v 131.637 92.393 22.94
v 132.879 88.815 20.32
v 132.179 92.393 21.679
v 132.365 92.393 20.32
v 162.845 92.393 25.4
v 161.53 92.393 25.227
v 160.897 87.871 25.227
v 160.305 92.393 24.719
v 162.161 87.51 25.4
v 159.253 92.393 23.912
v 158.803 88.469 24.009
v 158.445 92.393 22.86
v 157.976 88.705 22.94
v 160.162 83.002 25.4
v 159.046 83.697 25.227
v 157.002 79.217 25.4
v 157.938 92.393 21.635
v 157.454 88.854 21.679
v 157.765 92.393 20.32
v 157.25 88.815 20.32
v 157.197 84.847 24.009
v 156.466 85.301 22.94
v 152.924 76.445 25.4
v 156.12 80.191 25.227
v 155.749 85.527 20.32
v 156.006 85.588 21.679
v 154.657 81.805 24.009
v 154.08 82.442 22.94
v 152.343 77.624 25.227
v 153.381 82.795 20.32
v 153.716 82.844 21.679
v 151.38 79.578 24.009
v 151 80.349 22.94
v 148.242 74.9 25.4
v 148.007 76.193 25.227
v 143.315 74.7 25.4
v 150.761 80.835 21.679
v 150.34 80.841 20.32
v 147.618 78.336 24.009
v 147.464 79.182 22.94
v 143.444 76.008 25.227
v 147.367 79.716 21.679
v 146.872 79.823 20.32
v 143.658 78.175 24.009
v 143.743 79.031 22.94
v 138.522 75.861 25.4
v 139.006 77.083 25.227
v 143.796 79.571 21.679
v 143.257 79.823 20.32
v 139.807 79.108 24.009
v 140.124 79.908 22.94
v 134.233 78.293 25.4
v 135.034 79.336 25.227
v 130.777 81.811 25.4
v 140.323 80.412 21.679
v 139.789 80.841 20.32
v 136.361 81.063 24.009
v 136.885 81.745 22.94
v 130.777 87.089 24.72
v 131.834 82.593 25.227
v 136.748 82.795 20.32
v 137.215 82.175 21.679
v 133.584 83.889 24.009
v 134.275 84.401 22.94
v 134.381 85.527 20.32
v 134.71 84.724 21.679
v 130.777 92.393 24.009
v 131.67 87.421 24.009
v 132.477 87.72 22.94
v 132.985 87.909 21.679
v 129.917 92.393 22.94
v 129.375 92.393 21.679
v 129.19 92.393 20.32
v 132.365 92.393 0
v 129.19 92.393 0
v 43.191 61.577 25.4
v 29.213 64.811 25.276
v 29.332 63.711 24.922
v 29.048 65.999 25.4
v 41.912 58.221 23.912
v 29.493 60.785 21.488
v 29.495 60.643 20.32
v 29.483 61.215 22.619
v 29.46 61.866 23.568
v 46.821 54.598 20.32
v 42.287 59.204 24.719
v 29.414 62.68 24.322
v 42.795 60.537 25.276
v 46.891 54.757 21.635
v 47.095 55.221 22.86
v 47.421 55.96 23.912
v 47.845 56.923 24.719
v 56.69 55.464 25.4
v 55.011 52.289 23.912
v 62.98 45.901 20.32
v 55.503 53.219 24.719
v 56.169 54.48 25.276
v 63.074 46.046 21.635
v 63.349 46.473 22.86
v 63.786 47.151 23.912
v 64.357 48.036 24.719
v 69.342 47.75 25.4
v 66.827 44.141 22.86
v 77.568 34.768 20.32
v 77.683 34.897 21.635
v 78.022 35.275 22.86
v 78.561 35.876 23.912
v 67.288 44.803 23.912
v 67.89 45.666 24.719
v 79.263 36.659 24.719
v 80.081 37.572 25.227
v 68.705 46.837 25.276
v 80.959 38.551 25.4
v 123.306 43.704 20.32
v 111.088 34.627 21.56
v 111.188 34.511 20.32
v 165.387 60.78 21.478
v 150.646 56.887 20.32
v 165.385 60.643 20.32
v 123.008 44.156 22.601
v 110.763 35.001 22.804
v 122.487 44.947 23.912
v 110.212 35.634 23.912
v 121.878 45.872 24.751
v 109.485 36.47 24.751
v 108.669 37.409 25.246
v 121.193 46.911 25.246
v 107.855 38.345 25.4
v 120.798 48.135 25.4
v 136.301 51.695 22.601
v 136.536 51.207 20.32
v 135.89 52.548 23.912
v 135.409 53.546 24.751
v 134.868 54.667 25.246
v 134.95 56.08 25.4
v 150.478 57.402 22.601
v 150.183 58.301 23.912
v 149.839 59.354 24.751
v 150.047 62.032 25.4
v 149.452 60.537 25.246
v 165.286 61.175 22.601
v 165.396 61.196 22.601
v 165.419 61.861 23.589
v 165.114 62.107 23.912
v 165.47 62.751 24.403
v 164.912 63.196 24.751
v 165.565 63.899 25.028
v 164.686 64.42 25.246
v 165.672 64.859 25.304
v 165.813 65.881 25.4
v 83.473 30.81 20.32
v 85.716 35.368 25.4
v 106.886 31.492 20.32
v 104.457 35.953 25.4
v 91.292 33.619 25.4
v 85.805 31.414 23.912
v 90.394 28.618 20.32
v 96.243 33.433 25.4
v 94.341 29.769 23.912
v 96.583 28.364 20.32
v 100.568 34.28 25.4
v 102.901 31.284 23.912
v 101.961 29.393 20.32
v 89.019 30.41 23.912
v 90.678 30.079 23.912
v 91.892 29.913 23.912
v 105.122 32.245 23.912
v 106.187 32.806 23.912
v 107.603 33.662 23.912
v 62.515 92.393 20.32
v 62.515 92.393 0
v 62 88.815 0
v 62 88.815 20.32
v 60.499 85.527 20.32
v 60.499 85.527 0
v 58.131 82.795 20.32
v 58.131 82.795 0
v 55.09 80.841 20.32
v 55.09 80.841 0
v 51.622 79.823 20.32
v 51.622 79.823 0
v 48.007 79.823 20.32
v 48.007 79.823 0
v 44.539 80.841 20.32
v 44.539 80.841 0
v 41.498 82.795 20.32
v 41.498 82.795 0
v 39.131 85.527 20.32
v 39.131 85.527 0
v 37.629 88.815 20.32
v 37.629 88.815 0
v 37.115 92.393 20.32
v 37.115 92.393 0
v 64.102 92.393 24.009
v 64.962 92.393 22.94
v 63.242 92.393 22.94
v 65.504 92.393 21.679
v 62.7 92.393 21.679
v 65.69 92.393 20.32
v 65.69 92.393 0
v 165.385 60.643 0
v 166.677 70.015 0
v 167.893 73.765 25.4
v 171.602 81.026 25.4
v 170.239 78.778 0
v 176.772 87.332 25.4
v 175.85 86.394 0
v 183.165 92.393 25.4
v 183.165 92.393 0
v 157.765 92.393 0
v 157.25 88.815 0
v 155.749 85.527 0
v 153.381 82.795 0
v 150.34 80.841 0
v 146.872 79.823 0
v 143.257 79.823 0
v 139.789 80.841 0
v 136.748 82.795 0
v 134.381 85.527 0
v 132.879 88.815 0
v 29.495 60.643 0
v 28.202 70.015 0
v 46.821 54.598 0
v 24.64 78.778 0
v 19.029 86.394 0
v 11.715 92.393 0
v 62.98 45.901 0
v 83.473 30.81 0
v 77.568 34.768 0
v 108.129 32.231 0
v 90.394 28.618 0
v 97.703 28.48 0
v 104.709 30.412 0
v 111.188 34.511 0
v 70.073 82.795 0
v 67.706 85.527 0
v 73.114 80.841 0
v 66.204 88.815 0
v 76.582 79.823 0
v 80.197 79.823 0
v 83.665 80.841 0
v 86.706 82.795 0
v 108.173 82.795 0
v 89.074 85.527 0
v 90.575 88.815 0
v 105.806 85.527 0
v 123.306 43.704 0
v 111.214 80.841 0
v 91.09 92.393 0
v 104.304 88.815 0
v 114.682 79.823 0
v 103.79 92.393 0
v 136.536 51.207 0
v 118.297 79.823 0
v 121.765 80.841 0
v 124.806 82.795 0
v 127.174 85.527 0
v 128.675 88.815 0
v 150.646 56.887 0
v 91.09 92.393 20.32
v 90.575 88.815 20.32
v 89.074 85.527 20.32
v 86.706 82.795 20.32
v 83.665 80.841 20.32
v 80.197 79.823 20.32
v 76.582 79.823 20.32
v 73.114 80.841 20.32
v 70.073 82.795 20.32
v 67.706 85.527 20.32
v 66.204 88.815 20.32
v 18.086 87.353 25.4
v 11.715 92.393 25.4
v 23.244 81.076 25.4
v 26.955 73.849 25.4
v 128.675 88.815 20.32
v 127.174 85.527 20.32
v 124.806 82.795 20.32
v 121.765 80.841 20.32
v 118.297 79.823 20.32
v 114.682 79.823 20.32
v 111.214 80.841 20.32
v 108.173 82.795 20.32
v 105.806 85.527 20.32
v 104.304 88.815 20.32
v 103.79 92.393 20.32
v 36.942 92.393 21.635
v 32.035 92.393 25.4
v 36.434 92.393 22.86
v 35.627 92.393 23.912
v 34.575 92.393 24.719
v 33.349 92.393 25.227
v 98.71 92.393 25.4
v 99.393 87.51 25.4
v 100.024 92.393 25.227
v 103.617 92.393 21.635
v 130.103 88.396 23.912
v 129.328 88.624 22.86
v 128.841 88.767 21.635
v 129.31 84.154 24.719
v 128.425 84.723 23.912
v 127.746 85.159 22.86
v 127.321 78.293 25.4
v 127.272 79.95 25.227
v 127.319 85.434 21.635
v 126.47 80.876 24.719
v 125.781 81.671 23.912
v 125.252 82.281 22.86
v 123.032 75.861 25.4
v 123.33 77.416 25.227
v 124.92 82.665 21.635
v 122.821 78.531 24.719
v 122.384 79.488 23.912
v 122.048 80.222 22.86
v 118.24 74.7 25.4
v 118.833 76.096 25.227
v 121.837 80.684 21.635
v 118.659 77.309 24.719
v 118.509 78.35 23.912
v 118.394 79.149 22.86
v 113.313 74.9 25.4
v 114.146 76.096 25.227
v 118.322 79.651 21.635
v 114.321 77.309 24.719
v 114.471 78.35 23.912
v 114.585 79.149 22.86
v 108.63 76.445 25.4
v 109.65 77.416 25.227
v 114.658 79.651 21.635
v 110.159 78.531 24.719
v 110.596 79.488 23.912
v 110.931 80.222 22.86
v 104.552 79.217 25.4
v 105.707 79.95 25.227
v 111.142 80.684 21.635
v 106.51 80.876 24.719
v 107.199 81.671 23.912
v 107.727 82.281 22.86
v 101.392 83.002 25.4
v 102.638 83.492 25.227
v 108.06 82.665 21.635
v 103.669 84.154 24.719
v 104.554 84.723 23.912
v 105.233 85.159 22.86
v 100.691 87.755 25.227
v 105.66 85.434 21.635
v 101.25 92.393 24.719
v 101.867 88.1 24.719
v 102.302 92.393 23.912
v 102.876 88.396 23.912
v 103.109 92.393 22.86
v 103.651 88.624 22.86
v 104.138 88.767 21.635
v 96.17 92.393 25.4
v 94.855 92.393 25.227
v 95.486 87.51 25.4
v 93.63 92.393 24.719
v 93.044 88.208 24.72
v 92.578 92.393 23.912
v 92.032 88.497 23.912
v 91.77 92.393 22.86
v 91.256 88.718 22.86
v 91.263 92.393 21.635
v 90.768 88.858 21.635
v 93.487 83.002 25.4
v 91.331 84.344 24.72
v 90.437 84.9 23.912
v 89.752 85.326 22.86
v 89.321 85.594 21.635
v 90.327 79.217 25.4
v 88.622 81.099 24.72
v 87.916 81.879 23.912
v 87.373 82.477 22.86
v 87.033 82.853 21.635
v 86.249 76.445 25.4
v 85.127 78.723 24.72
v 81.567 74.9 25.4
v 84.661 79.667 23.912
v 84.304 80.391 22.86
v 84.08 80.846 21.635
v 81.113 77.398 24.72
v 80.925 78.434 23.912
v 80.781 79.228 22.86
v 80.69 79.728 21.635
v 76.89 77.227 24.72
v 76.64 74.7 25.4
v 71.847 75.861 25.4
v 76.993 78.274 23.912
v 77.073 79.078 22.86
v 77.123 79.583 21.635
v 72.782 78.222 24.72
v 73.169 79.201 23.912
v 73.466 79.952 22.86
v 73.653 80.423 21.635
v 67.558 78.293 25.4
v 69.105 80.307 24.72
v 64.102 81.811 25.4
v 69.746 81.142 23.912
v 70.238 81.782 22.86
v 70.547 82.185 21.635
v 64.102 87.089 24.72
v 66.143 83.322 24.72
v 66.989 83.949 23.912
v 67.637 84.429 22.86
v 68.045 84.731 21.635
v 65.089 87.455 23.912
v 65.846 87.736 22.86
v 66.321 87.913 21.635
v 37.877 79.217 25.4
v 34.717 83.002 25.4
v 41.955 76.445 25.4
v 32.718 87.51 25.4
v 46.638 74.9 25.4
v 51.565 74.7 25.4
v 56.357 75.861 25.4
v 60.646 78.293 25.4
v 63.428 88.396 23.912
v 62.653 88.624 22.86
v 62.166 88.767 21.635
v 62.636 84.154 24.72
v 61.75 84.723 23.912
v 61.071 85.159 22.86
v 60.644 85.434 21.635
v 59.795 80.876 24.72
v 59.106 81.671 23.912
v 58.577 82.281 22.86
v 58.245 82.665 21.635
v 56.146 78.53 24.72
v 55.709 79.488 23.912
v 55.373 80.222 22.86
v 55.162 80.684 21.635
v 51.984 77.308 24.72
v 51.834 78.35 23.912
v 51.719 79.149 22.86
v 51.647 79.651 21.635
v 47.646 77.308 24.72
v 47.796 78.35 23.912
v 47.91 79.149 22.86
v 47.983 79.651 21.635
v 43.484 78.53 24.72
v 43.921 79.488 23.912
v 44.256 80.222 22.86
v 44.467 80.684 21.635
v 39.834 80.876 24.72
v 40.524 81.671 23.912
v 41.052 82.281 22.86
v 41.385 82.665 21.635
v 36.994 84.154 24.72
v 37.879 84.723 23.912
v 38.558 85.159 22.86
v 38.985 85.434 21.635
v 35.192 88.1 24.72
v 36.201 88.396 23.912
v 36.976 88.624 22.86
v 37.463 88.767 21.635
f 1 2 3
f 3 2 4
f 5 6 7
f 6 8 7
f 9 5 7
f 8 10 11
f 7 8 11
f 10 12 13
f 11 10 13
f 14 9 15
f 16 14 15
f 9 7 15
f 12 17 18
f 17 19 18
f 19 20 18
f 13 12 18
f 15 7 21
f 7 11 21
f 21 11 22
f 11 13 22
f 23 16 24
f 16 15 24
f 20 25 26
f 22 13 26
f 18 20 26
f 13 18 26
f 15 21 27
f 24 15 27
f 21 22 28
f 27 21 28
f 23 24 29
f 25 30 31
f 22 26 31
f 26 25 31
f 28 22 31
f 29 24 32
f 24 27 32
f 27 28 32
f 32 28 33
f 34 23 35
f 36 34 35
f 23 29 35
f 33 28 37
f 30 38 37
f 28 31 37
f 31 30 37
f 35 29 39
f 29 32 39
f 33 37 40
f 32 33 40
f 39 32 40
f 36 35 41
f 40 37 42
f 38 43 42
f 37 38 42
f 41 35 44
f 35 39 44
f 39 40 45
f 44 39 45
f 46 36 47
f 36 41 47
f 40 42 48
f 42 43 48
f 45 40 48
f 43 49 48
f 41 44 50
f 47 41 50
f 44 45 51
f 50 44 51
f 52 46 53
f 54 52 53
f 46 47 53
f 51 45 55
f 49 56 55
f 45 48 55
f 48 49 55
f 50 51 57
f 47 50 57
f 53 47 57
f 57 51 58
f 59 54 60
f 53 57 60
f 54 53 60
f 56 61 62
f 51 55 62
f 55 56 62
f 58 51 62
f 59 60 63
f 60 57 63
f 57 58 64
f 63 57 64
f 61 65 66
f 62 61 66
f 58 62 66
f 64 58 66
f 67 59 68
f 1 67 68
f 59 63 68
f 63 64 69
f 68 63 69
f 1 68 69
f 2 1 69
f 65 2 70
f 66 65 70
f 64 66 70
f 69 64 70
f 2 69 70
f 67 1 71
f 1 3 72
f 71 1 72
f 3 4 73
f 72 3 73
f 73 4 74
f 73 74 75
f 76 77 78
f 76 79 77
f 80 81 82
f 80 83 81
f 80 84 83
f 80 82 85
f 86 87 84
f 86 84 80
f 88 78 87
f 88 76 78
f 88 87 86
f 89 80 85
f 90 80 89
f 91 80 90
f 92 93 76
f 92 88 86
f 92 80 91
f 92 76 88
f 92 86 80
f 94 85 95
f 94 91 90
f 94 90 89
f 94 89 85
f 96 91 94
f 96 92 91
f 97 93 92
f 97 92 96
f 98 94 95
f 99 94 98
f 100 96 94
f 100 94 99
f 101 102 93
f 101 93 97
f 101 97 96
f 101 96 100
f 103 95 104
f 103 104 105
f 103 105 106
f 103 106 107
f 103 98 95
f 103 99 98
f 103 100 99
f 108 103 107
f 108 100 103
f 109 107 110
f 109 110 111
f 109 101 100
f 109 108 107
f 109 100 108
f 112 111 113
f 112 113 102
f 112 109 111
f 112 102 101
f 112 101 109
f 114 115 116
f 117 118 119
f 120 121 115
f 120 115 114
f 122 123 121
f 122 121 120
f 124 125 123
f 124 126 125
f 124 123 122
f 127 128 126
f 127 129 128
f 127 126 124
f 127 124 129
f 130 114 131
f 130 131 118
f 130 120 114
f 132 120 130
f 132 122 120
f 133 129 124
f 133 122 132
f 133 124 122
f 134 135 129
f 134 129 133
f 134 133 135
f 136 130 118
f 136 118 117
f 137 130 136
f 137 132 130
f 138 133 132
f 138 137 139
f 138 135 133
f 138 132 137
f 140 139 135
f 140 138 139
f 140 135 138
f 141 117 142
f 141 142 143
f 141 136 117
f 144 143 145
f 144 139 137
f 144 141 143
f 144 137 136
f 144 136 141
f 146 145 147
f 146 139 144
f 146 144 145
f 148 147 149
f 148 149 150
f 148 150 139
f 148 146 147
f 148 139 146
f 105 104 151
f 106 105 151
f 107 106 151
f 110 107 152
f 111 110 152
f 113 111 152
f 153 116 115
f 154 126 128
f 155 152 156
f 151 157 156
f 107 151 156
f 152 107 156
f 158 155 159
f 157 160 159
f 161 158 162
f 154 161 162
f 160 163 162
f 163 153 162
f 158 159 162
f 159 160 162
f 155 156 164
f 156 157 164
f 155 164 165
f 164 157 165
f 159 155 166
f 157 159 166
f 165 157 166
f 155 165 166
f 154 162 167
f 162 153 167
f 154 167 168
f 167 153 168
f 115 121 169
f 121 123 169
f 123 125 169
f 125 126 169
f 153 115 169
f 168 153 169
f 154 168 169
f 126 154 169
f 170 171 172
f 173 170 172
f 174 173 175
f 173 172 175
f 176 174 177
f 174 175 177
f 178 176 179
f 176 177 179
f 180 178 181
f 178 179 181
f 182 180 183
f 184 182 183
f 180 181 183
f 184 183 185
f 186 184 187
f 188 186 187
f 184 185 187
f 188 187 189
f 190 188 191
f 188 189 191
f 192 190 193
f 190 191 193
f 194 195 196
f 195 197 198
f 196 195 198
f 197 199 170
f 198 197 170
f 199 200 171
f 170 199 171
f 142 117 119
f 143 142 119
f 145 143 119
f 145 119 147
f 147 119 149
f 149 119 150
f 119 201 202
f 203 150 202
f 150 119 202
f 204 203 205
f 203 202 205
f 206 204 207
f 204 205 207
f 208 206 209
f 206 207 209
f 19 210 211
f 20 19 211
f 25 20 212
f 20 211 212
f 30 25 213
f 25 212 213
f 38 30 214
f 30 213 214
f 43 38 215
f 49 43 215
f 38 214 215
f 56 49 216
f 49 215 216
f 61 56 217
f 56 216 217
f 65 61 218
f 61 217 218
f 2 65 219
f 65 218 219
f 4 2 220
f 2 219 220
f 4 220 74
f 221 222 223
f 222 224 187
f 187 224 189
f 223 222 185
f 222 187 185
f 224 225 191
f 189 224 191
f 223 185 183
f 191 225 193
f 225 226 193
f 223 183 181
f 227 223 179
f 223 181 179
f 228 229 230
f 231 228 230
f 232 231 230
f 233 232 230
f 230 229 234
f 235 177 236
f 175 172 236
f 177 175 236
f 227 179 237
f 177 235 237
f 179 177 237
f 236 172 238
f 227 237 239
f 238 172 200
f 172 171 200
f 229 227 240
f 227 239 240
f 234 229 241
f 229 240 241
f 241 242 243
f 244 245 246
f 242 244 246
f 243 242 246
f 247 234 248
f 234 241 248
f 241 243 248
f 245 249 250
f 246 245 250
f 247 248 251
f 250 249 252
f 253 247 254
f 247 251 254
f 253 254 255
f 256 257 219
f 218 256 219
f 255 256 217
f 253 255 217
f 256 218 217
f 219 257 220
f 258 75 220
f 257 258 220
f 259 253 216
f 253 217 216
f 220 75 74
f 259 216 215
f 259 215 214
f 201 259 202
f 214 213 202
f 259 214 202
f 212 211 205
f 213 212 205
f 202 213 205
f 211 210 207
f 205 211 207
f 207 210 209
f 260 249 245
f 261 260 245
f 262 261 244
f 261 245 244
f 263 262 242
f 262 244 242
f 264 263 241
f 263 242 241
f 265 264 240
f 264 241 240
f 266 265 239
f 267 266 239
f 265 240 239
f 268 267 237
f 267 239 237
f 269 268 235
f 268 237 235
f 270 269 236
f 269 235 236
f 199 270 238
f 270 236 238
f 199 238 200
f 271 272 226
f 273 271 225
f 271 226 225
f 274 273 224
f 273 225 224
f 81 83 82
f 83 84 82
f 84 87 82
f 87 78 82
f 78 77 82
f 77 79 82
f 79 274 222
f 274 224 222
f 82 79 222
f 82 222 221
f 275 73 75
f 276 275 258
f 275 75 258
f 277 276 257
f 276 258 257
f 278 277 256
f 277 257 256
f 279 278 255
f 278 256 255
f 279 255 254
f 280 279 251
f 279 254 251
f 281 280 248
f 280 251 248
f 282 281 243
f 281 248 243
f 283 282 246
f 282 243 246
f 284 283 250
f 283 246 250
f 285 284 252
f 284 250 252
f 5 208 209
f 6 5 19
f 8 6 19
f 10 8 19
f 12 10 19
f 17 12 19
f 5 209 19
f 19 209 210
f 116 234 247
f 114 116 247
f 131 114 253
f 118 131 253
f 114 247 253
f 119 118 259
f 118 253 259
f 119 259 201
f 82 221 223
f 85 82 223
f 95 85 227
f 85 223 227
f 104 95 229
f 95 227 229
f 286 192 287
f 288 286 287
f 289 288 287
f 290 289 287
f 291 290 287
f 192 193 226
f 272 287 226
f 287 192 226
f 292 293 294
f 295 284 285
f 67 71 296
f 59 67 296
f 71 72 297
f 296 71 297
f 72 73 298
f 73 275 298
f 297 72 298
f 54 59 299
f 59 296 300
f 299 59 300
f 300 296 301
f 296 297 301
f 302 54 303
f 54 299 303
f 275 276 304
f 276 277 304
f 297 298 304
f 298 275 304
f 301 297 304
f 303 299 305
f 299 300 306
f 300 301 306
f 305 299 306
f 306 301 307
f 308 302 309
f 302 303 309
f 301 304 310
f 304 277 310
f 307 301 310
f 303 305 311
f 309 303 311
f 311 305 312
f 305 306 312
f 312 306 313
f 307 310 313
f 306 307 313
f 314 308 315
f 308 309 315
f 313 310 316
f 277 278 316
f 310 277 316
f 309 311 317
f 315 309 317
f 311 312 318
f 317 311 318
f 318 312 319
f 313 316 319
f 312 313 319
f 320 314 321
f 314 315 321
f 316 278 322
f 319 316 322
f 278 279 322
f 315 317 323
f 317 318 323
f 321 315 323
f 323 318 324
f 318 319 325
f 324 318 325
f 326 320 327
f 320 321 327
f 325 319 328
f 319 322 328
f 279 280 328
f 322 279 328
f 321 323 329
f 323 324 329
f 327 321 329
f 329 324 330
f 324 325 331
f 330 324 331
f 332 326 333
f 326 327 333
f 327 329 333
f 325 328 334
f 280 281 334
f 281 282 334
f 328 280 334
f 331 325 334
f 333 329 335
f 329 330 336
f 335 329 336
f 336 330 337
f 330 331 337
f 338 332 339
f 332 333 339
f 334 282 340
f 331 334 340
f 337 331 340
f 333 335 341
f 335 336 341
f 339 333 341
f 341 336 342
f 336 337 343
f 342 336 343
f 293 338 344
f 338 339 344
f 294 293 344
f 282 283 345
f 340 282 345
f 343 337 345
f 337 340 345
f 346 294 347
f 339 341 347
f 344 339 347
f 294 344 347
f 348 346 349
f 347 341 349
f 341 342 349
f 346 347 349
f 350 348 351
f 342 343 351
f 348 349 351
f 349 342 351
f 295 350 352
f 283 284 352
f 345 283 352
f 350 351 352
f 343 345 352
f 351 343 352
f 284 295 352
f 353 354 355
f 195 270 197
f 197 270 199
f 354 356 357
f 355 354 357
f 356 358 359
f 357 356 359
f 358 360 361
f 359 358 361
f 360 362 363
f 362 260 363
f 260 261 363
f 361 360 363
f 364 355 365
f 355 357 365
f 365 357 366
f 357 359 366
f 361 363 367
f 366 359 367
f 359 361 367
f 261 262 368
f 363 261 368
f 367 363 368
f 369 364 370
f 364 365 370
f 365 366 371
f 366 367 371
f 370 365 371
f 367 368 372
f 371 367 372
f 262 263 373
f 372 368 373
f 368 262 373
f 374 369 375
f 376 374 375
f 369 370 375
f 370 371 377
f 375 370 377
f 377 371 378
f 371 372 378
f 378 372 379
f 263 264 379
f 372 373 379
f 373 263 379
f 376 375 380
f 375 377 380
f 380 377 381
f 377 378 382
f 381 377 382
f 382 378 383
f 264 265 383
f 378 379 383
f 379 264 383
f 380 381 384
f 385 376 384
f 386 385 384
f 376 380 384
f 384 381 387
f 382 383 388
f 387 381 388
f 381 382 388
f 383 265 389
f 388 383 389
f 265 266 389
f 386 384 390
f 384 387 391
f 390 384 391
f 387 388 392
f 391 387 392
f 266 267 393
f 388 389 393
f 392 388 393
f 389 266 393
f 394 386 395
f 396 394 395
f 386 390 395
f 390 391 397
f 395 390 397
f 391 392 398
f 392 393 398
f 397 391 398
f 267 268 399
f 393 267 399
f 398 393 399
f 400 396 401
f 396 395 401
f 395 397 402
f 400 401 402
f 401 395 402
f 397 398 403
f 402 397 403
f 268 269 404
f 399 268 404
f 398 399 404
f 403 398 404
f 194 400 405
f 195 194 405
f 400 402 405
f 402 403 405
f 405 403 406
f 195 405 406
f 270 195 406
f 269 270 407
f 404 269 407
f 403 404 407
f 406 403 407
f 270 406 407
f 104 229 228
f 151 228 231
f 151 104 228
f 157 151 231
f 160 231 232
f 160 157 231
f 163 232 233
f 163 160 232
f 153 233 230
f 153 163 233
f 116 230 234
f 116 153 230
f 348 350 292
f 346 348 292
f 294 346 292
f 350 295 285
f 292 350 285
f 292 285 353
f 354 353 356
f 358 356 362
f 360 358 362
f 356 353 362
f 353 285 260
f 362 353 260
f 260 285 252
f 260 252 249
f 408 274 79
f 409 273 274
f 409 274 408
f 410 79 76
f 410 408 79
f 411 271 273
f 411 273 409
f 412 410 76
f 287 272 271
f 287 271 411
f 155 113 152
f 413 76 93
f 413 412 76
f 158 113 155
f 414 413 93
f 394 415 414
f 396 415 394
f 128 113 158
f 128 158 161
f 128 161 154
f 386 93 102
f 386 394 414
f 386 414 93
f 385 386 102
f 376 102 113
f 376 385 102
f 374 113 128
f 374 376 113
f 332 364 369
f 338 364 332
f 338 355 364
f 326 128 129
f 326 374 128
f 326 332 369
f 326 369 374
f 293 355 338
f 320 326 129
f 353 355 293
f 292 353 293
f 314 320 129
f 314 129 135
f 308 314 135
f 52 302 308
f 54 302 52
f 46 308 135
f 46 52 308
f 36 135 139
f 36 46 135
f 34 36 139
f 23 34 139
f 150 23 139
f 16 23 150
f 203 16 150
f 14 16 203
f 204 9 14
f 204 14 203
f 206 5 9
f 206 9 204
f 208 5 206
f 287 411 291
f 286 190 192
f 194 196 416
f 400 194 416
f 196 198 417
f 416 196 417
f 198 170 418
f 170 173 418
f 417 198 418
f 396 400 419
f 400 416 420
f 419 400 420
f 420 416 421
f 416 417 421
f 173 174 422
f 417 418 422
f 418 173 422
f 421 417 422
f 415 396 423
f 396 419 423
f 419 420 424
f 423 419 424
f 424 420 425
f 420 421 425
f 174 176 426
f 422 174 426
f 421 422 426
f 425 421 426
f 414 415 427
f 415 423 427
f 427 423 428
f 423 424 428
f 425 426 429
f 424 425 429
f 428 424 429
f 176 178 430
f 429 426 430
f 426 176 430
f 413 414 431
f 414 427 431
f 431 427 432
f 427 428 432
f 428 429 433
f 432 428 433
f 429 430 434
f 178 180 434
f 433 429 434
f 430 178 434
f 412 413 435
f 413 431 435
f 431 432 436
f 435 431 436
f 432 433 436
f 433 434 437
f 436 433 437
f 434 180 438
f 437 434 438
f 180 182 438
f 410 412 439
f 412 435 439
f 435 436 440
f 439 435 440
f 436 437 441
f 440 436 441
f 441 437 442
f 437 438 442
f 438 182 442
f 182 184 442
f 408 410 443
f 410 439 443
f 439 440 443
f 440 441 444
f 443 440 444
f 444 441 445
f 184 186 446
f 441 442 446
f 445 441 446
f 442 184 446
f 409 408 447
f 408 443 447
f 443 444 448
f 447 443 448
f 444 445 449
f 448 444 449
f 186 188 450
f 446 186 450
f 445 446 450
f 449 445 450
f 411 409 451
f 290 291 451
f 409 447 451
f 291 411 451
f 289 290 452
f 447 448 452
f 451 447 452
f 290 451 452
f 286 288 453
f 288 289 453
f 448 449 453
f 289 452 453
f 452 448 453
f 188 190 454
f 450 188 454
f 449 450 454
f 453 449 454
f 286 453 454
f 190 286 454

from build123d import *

# Parameters (mm, degrees)
F1_DEPTH    = 25.4
F2_R        = 25.4
F3_T2_ANGLE = 294.7758439205
F3_T4_ANGLE = 294.7758439205
F3_T6_ANGLE = 294.7758439205
F3_T8_ANGLE = 294.7758439205
F4_R        = 5.08


# Not quite as in the source:
# - a fillet or chamfer that OpenCascade refuses, or shapes differently, is made with other operations: its cross-section is extruded or revolved along the edge and cut away or added


with BuildPart() as f1:
    # F0 (on Top) → F1 (new body)
    with BuildSketch(Plane.XY):
        with BuildLine():
            Line((37.1146484218, 92.3934370832), (11.7146484218, 92.3934370832))
            ThreePointArc((11.7146484218, 92.3934370832), (24.640162726, 78.7783250935), (29.4946484218, 60.6434370832))
            ThreePointArc((29.4946484218, 60.6434370832), (65.749840409, 44.0578596931), (94.2646484218, 16.1934370832))
            ThreePointArc((94.2646484218, 16.1934370832), (125.6004493922, 45.1771555306), (165.3846484218, 60.6434370832))
            ThreePointArc((165.3846484218, 60.6434370832), (170.2391341176, 78.7783250935), (183.1646484218, 92.3934370832))
            Line((183.1646484218, 92.3934370832), (157.7646484218, 92.3934370832))
            ThreePointArc((157.7646484218, 92.3934370832), (145.0646484218, 79.6934370832), (132.3646484218, 92.3934370832))
            Line((132.3646484218, 92.3934370832), (129.1896484218, 92.3934370832))
            ThreePointArc((129.1896484218, 92.3934370832), (116.4896484218, 79.6934370832), (103.7896484218, 92.3934370832))
            Line((103.7896484218, 92.3934370832), (91.0896484218, 92.3934370832))
            ThreePointArc((91.0896484218, 92.3934370832), (78.3896484218, 79.6934370832), (65.6896484218, 92.3934370832))
            Line((65.6896484218, 92.3934370832), (62.5146484218, 92.3934370832))
            ThreePointArc((62.5146484218, 92.3934370832), (49.8146484218, 79.6934370832), (37.1146484218, 92.3934370832))
        make_face()
    extrude(amount=F1_DEPTH)

    # F2
    f2_edges = [f1.edges().sort_by_distance(p)[0] for p in [
        (94.264648, 16.193437, 12.7),
    ]]
    fillet(f2_edges, radius=F2_R)

    # F3: fillet of radius 5.08 on 4 edges, made by hand

    # F3_s1 → F3_t2 (revolve, cut)
    with BuildSketch(Plane(origin=(-6.5992867665, 4.2223803326, 0), x_dir=(0, 0, 1), z_dir=(-0.8423388046, 0.5389483633, 0))):
        with BuildLine():
            ThreePointArc((25.4, 122.4541005786), (23.9121024484, 118.8619981302), (20.32, 117.3741005786))
            Line((20.32, 117.3741005786), (25.4, 117.3741005786))
            Line((25.4, 117.3741005786), (25.4, 122.4541005786))
        make_face()
    revolve(axis=Axis((49.8146484218, 92.3934370832, 25.4), (0, 0, -1)), revolution_arc=F3_T2_ANGLE, mode=Mode.SUBTRACT)

    # F3_s3 → F3_t4 (revolve, cut)
    with BuildSketch(Plane(origin=(40.7089368011, -26.0465441486, 0), x_dir=(0, 0, 1), z_dir=(-0.8423388046, 0.5389483633, 0))):
        with BuildLine():
            ThreePointArc((25.4, 158.3884827026), (23.9121024484, 154.7963802542), (20.32, 153.3084827026))
            Line((20.32, 153.3084827026), (25.4, 153.3084827026))
            Line((25.4, 153.3084827026), (25.4, 158.3884827026))
        make_face()
    revolve(axis=Axis((116.4896484218, 92.3934370832, 25.4), (0, 0, -1)), revolution_arc=F3_T4_ANGLE, mode=Mode.SUBTRACT)

    # F3_s5 → F3_t6 (revolve, cut)
    with BuildSketch(Plane(origin=(60.9838897586, -39.0189403548, 0), x_dir=(0, 0, 1), z_dir=(-0.8423388046, 0.5389483633, 0))):
        with BuildLine():
            ThreePointArc((25.4, 173.7889321843), (23.9121024484, 170.1968297359), (20.32, 168.7089321843))
            Line((20.32, 168.7089321843), (25.4, 168.7089321843))
            Line((25.4, 168.7089321843), (25.4, 173.7889321843))
        make_face()
    revolve(axis=Axis((145.0646484218, 92.3934370832, 25.4), (0, 0, -1)), revolution_arc=F3_T6_ANGLE, mode=Mode.SUBTRACT)

    # F3_s7 → F3_t8 (revolve, cut)
    with BuildSketch(Plane(origin=(13.6756661911, -8.7500158736, 0), x_dir=(0, 0, 1), z_dir=(-0.8423388046, 0.5389483633, 0))):
        with BuildLine():
            ThreePointArc((25.4, 137.8545500603), (23.9121024484, 134.2624476119), (20.32, 132.7745500603))
            Line((20.32, 132.7745500603), (25.4, 132.7745500603))
            Line((25.4, 132.7745500603), (25.4, 137.8545500603))
        make_face()
    revolve(axis=Axis((78.3896484218, 92.3934370832, 25.4), (0, 0, -1)), revolution_arc=F3_T8_ANGLE, mode=Mode.SUBTRACT)

    # F4
    f4_edges = [f1.edges().sort_by_distance(p)[0] for p in [
        (94.329479, 28.280902, 25.4),
    ]]
    fillet(f4_edges, radius=F4_R)


with BuildPart() as f5_1:
    # F5: copy of F1
    add(f1.part)


with BuildPart() as f6_1:
    # F6: copy of F5_1
    add(f5_1.part.moved(Location((0, 0, 50.8))))


solid = f1.part
